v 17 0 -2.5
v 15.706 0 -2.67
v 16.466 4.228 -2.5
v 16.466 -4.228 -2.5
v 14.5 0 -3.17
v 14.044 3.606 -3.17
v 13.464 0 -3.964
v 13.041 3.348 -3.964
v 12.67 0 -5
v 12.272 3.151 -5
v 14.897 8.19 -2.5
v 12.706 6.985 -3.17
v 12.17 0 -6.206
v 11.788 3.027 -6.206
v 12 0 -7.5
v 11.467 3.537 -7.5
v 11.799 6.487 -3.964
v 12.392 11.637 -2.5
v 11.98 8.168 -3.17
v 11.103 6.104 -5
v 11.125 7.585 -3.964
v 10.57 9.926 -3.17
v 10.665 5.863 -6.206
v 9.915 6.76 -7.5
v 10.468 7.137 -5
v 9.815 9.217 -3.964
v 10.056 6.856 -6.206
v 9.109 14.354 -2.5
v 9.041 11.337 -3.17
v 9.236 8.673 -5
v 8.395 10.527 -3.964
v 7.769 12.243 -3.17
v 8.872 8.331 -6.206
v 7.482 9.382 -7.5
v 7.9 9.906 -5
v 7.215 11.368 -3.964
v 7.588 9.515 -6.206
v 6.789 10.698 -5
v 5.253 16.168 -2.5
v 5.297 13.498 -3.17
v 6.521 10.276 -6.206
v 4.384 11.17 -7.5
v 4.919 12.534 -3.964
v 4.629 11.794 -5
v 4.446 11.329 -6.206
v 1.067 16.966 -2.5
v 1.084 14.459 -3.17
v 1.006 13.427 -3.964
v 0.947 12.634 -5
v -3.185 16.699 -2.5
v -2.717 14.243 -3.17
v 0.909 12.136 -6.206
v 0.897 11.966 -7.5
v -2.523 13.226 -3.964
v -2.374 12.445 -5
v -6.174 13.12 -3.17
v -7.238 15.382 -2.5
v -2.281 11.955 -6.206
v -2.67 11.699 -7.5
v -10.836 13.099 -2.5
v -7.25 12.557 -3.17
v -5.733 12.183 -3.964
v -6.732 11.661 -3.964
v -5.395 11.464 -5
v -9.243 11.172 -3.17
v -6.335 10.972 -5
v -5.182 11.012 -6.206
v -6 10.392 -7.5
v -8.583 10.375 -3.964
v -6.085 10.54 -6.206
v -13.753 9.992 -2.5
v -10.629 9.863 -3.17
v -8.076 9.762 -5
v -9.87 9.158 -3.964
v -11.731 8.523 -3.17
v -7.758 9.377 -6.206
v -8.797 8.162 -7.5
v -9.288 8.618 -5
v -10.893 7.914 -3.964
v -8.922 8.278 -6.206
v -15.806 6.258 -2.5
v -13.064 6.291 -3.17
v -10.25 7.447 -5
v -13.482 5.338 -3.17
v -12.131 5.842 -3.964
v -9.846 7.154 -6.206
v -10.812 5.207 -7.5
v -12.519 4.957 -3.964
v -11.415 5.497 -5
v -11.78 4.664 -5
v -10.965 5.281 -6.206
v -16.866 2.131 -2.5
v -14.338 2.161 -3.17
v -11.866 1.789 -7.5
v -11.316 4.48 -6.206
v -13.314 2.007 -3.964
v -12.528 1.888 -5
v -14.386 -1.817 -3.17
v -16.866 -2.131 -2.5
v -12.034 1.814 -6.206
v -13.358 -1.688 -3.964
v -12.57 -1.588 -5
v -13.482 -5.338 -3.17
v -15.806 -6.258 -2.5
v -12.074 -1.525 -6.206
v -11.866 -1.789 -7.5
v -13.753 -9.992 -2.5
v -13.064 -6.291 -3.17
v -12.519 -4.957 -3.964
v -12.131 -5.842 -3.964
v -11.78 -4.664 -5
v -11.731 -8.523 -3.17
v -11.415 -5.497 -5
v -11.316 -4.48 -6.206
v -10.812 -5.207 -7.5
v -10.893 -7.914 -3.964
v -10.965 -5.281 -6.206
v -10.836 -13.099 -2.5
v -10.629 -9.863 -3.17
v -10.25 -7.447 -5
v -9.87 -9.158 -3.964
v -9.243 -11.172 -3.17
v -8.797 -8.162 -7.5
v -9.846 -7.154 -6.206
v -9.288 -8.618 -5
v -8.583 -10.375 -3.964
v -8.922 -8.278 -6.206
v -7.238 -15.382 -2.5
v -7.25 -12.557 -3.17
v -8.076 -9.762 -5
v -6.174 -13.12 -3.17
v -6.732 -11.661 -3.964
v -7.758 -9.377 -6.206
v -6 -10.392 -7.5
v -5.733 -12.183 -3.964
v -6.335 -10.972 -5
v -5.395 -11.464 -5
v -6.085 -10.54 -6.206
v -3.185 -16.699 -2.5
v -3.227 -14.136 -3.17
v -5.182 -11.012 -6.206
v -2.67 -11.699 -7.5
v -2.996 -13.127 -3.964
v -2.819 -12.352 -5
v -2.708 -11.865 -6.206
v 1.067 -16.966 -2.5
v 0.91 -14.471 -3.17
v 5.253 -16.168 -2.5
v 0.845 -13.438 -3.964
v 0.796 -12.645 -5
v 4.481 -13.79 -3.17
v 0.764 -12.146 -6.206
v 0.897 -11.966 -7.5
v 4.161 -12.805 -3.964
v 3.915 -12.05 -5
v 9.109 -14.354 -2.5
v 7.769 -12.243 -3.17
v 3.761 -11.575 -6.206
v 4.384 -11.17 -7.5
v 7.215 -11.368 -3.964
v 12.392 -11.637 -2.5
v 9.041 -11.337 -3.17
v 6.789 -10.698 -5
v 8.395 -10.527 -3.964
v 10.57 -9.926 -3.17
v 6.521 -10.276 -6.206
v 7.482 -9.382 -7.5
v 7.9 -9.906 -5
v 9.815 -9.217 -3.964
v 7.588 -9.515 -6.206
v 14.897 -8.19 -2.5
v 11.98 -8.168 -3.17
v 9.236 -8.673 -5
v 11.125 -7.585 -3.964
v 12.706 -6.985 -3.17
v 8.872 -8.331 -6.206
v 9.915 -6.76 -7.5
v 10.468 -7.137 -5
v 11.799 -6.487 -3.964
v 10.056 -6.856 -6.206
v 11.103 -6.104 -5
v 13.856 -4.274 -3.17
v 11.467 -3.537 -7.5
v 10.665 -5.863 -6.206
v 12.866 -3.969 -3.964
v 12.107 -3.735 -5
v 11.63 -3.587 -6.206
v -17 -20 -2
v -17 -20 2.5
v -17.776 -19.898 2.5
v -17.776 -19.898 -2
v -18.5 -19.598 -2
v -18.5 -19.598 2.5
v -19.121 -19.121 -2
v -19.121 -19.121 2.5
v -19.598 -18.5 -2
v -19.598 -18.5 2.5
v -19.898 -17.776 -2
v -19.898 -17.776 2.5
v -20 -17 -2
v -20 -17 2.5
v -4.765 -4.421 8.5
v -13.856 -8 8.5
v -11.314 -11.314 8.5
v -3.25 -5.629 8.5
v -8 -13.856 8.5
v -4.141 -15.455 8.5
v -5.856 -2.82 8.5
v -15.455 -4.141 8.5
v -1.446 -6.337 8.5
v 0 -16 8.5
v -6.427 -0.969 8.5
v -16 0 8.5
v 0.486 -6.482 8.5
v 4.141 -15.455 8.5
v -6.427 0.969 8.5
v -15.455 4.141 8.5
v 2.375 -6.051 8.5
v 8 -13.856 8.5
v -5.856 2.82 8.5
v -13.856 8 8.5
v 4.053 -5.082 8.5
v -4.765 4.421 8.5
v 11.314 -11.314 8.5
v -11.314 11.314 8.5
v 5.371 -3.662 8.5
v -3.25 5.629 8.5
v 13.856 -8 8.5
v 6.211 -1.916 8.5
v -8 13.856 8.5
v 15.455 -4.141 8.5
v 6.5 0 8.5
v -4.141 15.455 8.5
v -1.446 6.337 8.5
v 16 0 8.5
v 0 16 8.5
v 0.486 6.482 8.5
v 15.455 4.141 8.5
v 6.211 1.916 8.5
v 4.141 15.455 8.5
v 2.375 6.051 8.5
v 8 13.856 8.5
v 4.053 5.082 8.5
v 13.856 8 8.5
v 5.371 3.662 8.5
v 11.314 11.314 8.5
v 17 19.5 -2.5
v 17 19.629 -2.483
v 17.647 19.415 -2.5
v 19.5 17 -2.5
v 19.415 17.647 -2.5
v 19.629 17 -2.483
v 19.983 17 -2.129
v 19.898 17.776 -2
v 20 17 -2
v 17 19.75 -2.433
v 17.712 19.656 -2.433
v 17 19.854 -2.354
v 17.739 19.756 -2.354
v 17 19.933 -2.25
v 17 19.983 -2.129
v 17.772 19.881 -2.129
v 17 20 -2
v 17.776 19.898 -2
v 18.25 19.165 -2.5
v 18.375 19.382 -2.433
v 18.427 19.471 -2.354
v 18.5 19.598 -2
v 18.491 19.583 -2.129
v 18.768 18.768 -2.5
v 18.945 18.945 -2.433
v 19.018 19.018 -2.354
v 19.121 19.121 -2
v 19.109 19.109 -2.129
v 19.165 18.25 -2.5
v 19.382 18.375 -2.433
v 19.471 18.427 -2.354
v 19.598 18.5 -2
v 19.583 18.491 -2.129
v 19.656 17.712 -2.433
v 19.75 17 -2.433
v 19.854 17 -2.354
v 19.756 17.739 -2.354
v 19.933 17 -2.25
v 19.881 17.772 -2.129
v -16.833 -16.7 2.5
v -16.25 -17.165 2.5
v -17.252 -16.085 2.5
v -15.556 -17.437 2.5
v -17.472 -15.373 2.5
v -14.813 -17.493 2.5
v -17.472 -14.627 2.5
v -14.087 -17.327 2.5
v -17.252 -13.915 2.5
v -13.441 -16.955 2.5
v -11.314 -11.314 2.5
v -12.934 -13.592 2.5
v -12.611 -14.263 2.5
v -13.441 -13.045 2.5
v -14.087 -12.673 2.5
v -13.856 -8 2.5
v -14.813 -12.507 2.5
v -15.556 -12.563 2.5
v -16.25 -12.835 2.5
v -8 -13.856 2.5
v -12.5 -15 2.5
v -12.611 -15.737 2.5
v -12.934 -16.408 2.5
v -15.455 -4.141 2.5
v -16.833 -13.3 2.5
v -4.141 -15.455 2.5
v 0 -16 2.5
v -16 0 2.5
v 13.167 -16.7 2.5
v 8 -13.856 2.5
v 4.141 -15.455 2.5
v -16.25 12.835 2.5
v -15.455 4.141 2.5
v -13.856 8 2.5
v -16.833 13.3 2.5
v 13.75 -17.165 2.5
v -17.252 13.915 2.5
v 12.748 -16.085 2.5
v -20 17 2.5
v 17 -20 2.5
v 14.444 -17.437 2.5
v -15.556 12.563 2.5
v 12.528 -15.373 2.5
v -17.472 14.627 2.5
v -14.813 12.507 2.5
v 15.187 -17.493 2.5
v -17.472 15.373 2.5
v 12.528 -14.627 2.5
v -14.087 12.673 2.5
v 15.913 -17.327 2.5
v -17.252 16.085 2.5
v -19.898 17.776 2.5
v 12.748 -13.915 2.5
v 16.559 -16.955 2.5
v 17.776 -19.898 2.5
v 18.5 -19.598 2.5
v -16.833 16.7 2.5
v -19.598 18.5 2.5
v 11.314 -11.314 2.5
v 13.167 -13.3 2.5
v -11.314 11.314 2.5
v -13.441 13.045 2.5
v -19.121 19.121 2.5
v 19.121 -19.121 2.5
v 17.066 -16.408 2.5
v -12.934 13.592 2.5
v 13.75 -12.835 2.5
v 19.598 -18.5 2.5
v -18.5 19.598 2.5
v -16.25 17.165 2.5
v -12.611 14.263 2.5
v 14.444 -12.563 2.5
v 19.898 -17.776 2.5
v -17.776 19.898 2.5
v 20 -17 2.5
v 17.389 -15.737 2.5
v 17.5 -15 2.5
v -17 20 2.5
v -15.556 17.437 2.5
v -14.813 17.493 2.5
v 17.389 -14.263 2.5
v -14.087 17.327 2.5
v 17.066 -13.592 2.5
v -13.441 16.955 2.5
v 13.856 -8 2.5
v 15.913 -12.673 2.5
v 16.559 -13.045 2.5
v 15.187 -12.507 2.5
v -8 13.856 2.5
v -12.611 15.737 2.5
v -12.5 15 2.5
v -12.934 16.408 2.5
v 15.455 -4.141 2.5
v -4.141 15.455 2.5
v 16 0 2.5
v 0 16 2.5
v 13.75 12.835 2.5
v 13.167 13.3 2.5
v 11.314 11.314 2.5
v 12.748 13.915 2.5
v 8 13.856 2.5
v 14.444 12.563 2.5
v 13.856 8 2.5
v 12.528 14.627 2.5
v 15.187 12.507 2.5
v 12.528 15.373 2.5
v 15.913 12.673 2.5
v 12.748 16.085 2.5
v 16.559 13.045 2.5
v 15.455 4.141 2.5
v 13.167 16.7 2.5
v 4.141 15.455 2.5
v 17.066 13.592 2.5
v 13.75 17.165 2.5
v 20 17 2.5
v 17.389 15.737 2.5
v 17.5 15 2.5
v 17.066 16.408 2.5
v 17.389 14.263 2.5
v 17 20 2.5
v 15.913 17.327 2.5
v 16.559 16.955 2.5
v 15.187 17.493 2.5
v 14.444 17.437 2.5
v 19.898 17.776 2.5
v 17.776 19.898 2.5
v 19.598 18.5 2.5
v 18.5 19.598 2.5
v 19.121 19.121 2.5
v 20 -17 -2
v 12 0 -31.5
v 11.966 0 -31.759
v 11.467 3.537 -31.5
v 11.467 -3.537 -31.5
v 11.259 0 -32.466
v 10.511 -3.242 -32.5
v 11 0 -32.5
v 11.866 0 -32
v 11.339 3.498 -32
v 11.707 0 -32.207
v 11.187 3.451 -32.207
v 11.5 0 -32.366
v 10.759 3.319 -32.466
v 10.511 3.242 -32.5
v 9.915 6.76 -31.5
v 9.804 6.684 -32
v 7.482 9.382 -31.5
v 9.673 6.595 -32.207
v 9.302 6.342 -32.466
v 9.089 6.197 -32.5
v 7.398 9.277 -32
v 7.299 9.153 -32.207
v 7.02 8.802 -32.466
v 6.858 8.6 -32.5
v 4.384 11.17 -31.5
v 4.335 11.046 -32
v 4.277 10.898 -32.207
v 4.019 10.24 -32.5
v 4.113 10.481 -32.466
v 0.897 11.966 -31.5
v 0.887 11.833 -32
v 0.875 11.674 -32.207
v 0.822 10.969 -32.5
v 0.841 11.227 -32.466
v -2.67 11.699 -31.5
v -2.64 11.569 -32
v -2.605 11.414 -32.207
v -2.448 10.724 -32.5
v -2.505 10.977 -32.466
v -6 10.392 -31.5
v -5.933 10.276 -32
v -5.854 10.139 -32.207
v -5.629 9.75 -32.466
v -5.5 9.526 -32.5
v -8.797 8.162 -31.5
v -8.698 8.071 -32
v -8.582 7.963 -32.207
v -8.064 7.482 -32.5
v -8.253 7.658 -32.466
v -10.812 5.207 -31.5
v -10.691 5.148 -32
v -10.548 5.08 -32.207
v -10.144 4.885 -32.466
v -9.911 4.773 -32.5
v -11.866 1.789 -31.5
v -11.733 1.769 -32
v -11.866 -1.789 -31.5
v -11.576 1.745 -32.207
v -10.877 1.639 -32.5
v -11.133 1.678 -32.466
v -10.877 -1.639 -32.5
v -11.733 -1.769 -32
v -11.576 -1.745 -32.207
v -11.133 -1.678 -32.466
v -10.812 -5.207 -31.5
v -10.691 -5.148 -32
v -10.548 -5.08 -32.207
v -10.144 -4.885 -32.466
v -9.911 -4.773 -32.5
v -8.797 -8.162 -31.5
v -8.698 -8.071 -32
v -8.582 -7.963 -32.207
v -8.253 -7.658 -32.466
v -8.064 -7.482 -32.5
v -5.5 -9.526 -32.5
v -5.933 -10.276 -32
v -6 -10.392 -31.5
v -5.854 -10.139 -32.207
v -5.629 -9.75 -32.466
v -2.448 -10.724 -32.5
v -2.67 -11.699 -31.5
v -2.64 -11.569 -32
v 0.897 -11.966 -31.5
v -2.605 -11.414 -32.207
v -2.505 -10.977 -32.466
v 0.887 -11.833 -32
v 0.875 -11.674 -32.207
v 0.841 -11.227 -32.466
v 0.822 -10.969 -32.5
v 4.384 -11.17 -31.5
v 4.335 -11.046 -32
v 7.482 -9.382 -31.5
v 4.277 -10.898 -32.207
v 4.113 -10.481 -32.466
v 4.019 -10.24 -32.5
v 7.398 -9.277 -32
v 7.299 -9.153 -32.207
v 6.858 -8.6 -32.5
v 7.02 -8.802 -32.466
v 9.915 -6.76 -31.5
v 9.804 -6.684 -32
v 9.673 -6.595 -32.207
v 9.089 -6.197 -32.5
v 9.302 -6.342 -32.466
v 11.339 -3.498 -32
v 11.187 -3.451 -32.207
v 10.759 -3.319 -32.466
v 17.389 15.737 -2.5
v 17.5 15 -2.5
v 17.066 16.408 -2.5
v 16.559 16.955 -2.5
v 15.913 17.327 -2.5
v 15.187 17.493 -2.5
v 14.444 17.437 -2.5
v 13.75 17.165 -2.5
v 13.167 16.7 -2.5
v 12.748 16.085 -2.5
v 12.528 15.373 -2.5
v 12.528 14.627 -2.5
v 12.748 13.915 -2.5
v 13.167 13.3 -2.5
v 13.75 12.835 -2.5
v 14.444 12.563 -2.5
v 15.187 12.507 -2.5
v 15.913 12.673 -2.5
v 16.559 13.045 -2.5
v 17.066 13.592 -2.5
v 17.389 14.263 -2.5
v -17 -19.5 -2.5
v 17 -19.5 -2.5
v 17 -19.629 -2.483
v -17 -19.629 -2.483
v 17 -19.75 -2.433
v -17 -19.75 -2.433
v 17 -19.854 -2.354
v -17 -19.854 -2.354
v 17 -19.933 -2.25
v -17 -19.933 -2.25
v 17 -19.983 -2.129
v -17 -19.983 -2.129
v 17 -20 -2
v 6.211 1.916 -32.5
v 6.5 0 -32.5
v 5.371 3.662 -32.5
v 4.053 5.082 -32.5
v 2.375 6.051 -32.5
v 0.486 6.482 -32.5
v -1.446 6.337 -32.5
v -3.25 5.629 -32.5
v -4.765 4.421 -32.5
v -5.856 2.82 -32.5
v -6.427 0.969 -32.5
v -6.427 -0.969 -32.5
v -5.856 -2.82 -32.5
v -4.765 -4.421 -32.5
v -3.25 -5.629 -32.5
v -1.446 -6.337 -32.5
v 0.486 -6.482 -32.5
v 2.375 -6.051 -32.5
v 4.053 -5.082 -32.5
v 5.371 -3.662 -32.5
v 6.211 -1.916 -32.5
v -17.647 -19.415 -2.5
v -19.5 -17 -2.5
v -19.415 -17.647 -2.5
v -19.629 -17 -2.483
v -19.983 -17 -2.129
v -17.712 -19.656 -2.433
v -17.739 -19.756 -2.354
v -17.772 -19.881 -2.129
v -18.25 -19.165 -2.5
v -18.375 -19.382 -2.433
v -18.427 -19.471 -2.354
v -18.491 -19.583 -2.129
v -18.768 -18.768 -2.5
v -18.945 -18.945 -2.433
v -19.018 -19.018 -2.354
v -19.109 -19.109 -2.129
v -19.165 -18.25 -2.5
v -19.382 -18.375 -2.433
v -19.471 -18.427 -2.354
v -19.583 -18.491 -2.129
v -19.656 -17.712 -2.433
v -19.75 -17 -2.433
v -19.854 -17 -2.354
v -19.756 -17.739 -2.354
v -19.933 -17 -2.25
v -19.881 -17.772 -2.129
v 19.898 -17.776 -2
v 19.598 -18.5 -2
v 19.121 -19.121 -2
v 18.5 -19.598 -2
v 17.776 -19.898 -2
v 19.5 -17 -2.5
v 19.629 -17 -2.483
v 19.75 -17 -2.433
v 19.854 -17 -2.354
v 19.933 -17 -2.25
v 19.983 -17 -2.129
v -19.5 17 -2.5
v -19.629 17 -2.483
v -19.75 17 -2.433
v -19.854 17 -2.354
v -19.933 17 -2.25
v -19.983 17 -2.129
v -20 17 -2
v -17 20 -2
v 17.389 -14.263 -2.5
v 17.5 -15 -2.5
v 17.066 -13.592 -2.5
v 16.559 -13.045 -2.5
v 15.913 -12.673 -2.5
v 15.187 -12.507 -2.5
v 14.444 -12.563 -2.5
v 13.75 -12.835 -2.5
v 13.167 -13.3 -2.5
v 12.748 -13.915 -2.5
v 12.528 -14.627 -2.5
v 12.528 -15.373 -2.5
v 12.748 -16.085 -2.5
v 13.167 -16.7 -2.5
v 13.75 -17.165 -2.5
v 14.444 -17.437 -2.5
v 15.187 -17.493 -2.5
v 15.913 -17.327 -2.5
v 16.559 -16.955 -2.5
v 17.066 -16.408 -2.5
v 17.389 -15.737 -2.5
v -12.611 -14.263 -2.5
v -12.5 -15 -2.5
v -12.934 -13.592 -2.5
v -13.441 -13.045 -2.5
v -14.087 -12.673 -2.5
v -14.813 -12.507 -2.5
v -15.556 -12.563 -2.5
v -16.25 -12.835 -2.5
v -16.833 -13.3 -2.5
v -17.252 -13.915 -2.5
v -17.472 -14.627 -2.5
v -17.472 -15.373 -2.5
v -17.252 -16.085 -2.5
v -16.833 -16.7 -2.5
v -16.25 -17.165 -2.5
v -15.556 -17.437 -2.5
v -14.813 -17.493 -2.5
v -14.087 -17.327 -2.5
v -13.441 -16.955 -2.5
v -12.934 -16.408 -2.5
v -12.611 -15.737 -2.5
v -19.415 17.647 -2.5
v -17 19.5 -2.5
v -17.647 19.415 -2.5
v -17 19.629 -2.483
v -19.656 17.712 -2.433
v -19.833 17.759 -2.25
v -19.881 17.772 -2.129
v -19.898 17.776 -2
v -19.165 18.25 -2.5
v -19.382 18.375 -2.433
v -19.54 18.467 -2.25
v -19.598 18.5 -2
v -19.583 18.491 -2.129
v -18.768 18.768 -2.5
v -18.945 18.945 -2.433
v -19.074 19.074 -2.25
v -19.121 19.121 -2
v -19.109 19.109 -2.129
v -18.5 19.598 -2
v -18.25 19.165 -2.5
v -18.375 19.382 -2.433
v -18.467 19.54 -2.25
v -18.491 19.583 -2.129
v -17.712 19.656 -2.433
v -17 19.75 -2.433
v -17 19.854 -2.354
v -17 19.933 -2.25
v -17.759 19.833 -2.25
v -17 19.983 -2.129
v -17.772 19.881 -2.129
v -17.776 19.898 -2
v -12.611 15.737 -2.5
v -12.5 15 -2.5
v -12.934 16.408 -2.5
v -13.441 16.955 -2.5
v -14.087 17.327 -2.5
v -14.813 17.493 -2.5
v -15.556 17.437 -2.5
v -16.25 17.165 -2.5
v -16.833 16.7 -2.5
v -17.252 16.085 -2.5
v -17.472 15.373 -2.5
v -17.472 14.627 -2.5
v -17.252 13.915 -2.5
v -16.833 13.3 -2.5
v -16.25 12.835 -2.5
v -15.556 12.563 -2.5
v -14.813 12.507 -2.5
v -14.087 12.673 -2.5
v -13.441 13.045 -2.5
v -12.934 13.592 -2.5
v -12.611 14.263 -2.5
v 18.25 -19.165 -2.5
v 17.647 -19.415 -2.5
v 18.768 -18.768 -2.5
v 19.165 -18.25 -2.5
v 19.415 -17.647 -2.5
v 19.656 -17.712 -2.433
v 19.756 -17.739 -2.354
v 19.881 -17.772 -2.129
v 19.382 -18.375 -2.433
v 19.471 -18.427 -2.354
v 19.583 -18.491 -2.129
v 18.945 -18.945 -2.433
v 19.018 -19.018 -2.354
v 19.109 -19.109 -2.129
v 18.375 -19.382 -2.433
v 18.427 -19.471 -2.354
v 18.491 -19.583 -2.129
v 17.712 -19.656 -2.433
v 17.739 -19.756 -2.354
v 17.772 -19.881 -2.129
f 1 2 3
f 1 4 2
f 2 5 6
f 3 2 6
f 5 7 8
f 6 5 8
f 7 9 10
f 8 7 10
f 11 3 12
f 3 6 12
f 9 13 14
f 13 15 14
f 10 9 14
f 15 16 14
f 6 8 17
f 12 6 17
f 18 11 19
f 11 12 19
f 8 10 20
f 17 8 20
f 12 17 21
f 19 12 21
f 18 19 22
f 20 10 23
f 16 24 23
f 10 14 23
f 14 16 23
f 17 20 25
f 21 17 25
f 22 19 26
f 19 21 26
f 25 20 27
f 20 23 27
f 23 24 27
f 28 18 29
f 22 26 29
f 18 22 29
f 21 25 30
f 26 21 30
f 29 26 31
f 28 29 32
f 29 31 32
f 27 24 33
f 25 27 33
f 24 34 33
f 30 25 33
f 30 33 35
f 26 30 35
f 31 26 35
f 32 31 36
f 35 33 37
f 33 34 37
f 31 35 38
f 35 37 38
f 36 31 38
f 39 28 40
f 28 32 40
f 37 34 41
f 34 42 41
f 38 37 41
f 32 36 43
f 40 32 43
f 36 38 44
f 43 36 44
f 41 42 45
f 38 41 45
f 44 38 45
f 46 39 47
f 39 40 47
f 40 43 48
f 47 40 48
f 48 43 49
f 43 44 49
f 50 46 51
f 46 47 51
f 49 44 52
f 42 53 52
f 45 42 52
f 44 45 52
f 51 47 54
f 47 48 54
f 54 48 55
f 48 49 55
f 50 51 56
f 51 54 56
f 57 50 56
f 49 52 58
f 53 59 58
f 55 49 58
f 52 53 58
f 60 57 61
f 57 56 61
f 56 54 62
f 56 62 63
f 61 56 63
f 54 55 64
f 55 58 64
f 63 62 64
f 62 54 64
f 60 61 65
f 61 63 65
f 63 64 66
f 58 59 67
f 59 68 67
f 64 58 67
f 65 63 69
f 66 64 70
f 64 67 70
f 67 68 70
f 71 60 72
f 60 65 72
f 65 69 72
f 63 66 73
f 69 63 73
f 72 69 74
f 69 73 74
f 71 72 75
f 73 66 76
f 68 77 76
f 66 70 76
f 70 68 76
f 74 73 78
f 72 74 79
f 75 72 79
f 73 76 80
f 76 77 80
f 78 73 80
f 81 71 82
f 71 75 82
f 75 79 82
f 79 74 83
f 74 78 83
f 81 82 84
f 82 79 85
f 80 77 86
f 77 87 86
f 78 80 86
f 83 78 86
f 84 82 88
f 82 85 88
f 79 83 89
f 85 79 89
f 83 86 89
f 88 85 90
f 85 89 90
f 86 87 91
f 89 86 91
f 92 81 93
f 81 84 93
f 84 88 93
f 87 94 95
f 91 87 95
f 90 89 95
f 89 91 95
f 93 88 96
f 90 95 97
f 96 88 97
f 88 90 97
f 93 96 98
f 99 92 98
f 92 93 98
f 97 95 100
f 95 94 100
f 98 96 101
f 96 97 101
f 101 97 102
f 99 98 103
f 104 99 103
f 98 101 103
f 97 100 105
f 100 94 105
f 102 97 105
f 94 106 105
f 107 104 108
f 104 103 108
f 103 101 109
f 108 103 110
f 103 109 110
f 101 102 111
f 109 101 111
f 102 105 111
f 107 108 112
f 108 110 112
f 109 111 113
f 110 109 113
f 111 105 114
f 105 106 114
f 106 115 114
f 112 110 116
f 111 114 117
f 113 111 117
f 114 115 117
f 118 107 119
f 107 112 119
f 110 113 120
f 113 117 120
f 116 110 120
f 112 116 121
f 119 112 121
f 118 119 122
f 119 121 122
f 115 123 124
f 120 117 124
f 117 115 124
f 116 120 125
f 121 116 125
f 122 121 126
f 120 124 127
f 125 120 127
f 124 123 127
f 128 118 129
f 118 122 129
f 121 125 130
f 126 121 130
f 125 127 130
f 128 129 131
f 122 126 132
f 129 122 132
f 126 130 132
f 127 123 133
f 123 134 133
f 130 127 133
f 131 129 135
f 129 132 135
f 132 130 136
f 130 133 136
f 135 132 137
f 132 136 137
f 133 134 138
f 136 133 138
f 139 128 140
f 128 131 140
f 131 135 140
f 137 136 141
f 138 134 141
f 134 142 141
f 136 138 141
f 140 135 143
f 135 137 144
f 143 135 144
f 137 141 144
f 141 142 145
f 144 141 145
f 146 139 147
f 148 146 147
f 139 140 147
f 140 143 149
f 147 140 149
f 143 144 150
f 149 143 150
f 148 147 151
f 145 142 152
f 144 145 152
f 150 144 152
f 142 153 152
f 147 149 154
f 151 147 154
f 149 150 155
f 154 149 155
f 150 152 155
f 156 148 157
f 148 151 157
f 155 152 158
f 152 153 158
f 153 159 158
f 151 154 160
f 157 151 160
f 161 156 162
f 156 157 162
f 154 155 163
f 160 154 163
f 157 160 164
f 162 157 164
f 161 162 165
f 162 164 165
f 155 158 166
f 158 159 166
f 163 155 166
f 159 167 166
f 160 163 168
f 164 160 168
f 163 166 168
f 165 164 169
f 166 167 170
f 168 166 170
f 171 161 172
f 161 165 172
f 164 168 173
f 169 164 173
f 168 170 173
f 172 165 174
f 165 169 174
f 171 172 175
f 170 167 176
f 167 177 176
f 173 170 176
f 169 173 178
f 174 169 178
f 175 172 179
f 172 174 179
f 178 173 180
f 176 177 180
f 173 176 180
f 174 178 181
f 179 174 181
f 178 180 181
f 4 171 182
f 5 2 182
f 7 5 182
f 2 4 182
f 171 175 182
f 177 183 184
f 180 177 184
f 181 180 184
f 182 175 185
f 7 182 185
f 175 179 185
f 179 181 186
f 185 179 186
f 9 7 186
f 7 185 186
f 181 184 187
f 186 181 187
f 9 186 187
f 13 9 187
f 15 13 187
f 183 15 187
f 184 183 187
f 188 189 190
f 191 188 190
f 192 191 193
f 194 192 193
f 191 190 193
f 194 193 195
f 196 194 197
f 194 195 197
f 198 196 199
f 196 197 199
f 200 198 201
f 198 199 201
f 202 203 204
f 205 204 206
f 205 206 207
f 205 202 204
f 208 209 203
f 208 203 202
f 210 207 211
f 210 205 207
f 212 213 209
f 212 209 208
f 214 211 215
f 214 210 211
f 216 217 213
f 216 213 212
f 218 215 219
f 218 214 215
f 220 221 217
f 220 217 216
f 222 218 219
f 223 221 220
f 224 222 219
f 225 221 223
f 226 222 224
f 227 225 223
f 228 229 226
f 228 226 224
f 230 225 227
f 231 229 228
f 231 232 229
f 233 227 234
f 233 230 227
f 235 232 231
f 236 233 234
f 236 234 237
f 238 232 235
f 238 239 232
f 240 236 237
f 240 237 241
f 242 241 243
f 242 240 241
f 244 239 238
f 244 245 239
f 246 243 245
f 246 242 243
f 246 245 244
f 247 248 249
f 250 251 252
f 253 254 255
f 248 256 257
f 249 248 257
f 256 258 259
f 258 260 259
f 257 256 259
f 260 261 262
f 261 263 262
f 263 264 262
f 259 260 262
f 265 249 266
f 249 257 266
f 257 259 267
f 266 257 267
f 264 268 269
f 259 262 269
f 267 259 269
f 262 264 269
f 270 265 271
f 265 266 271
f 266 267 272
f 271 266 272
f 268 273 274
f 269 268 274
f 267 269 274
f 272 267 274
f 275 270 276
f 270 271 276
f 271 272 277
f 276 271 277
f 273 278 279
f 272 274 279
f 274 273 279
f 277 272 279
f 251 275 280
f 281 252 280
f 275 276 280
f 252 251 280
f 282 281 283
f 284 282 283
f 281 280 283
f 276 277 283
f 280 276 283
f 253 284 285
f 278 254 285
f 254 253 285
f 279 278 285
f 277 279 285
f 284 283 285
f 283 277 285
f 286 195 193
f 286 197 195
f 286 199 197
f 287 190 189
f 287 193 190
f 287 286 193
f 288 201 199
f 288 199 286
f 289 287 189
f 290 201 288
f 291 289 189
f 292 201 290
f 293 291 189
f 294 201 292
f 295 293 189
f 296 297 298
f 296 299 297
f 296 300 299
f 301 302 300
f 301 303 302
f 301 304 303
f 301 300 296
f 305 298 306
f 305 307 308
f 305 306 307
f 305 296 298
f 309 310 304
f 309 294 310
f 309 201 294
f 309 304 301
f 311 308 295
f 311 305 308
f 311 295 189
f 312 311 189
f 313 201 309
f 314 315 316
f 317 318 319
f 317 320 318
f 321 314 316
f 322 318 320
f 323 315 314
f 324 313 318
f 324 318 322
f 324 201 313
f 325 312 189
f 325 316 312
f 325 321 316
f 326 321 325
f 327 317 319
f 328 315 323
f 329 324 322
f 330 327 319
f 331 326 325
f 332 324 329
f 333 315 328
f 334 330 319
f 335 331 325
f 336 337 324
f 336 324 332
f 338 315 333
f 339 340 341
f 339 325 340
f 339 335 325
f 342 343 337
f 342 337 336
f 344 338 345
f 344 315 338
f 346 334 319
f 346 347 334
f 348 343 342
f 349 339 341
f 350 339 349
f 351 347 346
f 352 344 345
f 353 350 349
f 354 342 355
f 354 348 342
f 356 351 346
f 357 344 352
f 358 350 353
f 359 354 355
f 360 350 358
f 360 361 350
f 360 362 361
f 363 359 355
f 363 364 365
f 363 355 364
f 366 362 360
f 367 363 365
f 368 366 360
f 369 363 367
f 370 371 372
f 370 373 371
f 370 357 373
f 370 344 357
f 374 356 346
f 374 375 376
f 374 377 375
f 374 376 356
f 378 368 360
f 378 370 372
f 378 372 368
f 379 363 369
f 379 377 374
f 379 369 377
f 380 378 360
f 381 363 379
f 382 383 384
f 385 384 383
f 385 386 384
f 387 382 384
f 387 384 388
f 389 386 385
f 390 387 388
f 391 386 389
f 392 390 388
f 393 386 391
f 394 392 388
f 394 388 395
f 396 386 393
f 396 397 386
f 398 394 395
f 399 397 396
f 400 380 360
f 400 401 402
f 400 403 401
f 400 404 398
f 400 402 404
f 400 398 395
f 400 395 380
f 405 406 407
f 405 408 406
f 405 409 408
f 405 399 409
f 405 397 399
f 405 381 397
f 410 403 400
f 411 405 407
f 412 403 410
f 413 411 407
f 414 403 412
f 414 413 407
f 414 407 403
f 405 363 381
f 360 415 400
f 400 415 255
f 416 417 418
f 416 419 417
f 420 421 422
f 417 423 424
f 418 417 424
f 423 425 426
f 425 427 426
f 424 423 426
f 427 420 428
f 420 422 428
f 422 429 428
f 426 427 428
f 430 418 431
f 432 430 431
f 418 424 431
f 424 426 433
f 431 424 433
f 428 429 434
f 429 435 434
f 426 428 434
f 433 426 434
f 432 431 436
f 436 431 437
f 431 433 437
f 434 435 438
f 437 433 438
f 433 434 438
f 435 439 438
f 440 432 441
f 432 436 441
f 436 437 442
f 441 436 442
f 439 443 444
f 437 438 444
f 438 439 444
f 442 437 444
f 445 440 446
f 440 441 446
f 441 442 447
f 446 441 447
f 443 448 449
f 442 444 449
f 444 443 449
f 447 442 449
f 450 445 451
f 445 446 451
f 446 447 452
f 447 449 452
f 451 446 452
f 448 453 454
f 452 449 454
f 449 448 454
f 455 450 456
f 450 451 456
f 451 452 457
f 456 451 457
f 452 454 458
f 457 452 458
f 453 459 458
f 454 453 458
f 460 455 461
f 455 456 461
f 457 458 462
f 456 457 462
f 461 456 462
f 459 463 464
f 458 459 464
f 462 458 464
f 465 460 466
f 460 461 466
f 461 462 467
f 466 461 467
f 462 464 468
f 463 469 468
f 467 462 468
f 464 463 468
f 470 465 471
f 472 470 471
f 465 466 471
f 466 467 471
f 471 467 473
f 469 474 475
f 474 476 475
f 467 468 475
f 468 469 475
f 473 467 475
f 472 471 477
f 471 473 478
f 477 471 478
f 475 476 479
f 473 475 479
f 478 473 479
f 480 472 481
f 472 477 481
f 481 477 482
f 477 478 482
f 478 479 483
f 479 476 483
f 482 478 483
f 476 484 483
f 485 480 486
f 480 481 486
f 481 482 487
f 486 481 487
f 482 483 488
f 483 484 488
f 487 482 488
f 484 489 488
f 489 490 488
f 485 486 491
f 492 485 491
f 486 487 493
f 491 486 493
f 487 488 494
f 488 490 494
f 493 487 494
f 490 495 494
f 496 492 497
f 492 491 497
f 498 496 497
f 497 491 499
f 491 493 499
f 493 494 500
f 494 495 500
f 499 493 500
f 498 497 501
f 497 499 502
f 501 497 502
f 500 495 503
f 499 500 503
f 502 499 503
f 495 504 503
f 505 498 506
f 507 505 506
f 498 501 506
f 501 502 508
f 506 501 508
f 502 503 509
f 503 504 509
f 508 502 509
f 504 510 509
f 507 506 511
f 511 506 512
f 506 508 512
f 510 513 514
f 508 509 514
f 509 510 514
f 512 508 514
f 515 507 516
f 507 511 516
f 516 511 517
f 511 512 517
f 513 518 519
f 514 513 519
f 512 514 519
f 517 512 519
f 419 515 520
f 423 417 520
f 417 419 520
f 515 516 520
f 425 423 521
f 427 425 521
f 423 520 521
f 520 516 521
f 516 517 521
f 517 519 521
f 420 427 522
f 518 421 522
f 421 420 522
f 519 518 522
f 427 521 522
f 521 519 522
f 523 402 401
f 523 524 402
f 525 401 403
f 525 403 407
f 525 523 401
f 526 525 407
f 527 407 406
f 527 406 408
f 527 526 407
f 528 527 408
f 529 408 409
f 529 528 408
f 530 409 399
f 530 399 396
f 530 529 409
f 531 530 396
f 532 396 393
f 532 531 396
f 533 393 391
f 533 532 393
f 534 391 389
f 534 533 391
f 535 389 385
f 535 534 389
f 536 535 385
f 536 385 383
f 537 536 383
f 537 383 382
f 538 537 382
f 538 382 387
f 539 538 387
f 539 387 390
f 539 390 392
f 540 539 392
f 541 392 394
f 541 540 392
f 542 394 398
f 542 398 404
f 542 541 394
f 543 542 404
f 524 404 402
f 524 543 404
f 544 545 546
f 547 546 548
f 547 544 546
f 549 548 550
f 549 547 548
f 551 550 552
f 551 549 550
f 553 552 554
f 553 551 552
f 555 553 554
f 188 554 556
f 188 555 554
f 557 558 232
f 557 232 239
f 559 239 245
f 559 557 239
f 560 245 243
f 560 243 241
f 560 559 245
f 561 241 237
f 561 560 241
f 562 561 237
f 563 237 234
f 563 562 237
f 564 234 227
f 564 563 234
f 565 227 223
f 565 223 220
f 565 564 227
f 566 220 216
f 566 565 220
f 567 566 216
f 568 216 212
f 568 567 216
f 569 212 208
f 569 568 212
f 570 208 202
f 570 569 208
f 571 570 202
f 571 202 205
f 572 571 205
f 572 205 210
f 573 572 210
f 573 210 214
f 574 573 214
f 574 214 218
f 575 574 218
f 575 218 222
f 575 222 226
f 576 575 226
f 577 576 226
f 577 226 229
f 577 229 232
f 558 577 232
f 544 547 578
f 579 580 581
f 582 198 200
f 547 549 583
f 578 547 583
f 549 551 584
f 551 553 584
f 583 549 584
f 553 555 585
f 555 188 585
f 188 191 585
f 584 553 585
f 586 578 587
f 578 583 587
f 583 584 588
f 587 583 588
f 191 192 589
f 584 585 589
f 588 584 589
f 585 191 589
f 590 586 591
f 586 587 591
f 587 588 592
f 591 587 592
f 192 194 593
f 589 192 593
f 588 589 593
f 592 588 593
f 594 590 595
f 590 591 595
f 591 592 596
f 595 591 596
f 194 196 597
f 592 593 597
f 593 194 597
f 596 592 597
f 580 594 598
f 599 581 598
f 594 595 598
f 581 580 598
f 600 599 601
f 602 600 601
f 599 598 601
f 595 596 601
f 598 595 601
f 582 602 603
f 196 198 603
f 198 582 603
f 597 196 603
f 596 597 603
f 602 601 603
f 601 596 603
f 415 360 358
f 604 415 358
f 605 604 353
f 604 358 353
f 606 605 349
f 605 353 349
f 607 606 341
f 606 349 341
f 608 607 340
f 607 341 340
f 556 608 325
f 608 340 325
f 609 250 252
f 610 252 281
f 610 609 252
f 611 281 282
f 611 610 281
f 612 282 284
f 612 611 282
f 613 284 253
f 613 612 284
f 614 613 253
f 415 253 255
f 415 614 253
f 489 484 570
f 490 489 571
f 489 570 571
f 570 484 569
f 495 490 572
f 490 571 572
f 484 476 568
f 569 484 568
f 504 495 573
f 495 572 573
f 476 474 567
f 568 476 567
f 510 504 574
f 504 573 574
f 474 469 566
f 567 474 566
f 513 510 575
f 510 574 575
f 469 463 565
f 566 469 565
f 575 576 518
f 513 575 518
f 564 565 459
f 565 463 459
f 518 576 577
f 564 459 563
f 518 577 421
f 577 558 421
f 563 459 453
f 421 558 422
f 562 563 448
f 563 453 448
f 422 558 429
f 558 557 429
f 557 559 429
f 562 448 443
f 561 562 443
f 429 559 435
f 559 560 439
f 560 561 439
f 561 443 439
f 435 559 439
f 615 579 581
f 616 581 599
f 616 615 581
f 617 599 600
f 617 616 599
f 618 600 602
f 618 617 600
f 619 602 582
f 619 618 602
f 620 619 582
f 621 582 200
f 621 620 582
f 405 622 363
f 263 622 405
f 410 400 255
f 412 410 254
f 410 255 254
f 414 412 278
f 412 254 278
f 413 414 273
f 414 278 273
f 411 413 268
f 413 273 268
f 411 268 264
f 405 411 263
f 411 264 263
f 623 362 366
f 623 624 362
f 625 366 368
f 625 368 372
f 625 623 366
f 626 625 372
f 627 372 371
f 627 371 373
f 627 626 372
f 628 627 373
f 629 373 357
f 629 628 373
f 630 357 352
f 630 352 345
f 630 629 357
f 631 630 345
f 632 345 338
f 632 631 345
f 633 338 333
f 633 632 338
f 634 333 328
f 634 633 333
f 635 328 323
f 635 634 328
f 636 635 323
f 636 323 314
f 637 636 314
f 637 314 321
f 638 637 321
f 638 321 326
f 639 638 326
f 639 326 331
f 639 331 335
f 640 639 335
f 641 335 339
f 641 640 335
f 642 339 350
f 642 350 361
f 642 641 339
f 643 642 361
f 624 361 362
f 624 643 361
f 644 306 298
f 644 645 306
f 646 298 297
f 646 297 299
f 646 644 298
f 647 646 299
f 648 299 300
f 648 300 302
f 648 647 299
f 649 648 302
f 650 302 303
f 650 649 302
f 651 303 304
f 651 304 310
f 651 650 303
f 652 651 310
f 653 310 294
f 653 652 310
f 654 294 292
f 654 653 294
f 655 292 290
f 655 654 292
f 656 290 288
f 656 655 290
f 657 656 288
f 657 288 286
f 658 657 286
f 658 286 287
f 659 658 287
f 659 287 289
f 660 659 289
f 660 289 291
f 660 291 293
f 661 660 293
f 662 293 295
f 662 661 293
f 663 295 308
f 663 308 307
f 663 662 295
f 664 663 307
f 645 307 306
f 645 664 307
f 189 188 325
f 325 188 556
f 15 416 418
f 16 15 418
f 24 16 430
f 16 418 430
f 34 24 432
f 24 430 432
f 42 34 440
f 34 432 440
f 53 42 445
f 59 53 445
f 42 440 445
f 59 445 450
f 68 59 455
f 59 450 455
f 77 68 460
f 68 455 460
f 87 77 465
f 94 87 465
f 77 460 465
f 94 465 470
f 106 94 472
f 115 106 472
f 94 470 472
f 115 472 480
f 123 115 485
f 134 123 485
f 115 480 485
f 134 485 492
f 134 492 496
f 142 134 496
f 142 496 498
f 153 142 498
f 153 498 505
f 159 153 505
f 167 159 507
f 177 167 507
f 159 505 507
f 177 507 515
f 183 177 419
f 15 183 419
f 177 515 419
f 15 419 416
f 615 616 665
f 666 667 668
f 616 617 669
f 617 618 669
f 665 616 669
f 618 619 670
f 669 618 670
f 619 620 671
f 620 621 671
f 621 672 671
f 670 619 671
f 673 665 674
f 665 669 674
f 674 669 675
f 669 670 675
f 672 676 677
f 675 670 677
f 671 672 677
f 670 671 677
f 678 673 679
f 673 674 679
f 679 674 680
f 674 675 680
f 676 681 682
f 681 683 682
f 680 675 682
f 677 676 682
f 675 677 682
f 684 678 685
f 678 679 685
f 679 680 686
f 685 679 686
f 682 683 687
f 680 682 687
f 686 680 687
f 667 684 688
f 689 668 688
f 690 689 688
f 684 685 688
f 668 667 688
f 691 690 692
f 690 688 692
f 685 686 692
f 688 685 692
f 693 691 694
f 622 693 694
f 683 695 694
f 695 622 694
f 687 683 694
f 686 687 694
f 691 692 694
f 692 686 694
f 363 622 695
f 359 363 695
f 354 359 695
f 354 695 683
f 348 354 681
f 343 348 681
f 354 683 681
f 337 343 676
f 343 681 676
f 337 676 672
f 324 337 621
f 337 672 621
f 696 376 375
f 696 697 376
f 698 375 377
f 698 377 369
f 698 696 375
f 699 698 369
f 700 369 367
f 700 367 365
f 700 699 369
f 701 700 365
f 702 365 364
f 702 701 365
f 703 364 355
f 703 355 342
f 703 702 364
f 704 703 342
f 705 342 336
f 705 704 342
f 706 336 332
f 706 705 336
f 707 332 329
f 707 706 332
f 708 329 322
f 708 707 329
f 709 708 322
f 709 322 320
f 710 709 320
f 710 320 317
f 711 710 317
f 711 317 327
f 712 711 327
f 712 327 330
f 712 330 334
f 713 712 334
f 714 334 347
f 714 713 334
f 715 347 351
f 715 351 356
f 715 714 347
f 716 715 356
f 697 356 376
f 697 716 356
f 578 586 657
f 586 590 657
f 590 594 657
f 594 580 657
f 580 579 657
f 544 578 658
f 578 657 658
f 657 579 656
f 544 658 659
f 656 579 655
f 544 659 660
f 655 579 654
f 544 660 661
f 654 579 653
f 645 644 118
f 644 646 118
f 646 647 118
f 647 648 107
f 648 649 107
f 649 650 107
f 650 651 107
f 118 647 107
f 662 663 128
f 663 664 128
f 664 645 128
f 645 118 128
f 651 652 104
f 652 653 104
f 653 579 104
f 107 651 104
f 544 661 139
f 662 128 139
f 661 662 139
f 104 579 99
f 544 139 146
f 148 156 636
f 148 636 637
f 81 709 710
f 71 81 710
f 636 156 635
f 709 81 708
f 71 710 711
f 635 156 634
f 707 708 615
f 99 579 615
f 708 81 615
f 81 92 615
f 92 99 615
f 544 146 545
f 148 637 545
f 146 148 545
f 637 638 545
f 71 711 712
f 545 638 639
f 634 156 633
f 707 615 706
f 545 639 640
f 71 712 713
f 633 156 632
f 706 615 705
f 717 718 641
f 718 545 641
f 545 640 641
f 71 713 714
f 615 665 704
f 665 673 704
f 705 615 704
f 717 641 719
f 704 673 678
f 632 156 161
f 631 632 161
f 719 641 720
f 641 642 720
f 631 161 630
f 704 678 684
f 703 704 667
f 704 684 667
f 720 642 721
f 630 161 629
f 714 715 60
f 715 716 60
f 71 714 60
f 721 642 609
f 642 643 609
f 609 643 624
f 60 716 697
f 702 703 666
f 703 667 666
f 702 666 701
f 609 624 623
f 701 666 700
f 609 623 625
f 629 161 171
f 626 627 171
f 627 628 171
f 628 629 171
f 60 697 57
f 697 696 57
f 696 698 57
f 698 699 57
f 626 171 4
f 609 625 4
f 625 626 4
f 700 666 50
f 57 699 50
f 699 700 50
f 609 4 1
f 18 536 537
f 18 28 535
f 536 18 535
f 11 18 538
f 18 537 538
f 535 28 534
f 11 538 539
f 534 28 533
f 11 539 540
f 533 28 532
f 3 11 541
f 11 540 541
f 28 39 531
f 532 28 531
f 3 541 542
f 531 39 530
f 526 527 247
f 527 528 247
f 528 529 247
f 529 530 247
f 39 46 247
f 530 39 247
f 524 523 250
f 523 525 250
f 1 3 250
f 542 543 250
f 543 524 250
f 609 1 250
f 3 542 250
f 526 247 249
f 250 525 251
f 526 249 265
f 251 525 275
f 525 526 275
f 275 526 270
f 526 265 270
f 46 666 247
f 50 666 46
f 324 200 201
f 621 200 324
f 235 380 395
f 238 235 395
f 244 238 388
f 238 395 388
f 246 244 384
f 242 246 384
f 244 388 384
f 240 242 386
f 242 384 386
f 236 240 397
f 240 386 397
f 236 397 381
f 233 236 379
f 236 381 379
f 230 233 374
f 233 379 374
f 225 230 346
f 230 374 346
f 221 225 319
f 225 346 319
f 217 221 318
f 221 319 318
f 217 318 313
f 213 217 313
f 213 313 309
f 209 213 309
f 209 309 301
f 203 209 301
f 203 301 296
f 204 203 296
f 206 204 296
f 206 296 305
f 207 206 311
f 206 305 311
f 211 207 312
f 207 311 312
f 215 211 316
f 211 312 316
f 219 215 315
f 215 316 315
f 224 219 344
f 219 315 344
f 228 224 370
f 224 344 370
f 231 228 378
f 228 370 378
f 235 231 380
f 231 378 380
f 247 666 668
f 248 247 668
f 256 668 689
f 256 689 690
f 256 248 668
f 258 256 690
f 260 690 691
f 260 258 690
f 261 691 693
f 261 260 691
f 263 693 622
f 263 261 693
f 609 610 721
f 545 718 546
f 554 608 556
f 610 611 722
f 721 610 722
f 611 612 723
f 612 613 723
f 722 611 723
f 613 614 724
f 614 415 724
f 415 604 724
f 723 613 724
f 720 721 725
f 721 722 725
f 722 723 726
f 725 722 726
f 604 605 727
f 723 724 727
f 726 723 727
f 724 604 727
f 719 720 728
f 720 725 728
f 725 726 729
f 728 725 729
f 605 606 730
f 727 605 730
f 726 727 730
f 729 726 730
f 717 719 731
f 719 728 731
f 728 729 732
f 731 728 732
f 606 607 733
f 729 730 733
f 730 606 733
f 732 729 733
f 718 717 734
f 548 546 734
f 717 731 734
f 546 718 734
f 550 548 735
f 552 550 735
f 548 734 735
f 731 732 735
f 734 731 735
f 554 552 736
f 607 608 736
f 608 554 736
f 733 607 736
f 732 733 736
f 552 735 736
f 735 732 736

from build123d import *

# Parameters (mm, degrees)
SKETCH2_W            = 40
SKETCH2_H            = 40
SKETCH2_R            = 2.5
SKETCH2_R_2          = 16
SKETCH2_R_3          = 6.5
SKETCH2_R_4          = 12
BOSS_EXTRUDE5_DEPTH  = 2.5
BOSS_EXTRUDE8_START  = 2.5
SKETCH2_9_R          = 16
SKETCH2_9_R_2        = 6.5
SKETCH2_9_R_3        = 12
BOSS_EXTRUDE8_DEPTH  = 6
BOSS_EXTRUDE10_START = -32.5
SKETCH2_12_R         = 12
SKETCH2_12_R_2       = 6.5
BOSS_EXTRUDE10_DEPTH = 30
FILLET1_R            = 3
FILLET2_R            = 0.5
FILLET3_R            = 5
FILLET4_R            = 1


with BuildPart() as part:
    # Sketch2 → Boss-Extrude5 (new, symmetric)
    # profile 1 of 3: a face of its own
    with BuildSketch(Plane.XY):
        Rectangle(SKETCH2_W, SKETCH2_H)
        with Locations((-15, -15)):
            Circle(SKETCH2_R, mode=Mode.SUBTRACT)
        with Locations((15, -15)):
            Circle(SKETCH2_R, mode=Mode.SUBTRACT)
        with Locations((15, 15)):
            Circle(SKETCH2_R, mode=Mode.SUBTRACT)
        with Locations((-15, 15)):
            Circle(SKETCH2_R, mode=Mode.SUBTRACT)
        Circle(SKETCH2_R_2, mode=Mode.SUBTRACT)
    # profile 2 of 3: a face of its own
    with BuildSketch(Plane.XY):
        Circle(SKETCH2_R_2)
        Circle(SKETCH2_R_3, mode=Mode.SUBTRACT)
    # profile 3 of 3: a face of its own
    with BuildSketch(Plane.XY):
        Circle(SKETCH2_R_4)
        Circle(SKETCH2_R_3, mode=Mode.SUBTRACT)
    extrude(amount=BOSS_EXTRUDE5_DEPTH, both=True)

    # Sketch2<9> → Boss-Extrude8 (add)
    # profile 1 of 2: a face of its own
    with BuildSketch(Plane.XY.offset(BOSS_EXTRUDE8_START)):
        Circle(SKETCH2_9_R)
        Circle(SKETCH2_9_R_2, mode=Mode.SUBTRACT)
    # profile 2 of 2: a face of its own
    with BuildSketch(Plane.XY.offset(BOSS_EXTRUDE8_START)):
        Circle(SKETCH2_9_R_3)
        Circle(SKETCH2_9_R_2, mode=Mode.SUBTRACT)
    extrude(amount=BOSS_EXTRUDE8_DEPTH)

    # Sketch2<12> → Boss-Extrude10 (add)
    with BuildSketch(Plane.XY.offset(BOSS_EXTRUDE10_START)):
        Circle(SKETCH2_12_R)
        Circle(SKETCH2_12_R_2, mode=Mode.SUBTRACT)
    extrude(amount=BOSS_EXTRUDE10_DEPTH)

    # Fillet1
    fillet1_edges = [part.edges().sort_by_distance(p)[0] for p in [
        (20, -20, 0),
        (-20, -20, 0),
        (-20, 20, 0),
        (20, 20, 0),
    ]]
    fillet(fillet1_edges, radius=FILLET1_R)

    # Fillet2
    fillet2_edges = [part.edges().sort_by_distance(p)[0] for p in [
        (0, 20, -2.5),
        (20, 0, -2.5),
        (0, -20, -2.5),
        (-20, 0, -2.5),
        (-19.121320344, 19.121320344, -2.5),
        (-19.121320344, -19.121320344, -2.5),
        (19.121320344, -19.121320344, -2.5),
        (19.121320344, 19.121320344, -2.5),
    ]]
    fillet(fillet2_edges, radius=FILLET2_R)

    # Fillet3
    fillet3_edges = [part.edges().sort_by_distance(p)[0] for p in [
        (-12, 0, -2.5),
    ]]
    fillet(fillet3_edges, radius=FILLET3_R)

    # Fillet4
    fillet4_edges = [part.edges().sort_by_distance(p)[0] for p in [
        (-12, 0, -32.5),
    ]]
    fillet(fillet4_edges, radius=FILLET4_R)


solid = part.part
